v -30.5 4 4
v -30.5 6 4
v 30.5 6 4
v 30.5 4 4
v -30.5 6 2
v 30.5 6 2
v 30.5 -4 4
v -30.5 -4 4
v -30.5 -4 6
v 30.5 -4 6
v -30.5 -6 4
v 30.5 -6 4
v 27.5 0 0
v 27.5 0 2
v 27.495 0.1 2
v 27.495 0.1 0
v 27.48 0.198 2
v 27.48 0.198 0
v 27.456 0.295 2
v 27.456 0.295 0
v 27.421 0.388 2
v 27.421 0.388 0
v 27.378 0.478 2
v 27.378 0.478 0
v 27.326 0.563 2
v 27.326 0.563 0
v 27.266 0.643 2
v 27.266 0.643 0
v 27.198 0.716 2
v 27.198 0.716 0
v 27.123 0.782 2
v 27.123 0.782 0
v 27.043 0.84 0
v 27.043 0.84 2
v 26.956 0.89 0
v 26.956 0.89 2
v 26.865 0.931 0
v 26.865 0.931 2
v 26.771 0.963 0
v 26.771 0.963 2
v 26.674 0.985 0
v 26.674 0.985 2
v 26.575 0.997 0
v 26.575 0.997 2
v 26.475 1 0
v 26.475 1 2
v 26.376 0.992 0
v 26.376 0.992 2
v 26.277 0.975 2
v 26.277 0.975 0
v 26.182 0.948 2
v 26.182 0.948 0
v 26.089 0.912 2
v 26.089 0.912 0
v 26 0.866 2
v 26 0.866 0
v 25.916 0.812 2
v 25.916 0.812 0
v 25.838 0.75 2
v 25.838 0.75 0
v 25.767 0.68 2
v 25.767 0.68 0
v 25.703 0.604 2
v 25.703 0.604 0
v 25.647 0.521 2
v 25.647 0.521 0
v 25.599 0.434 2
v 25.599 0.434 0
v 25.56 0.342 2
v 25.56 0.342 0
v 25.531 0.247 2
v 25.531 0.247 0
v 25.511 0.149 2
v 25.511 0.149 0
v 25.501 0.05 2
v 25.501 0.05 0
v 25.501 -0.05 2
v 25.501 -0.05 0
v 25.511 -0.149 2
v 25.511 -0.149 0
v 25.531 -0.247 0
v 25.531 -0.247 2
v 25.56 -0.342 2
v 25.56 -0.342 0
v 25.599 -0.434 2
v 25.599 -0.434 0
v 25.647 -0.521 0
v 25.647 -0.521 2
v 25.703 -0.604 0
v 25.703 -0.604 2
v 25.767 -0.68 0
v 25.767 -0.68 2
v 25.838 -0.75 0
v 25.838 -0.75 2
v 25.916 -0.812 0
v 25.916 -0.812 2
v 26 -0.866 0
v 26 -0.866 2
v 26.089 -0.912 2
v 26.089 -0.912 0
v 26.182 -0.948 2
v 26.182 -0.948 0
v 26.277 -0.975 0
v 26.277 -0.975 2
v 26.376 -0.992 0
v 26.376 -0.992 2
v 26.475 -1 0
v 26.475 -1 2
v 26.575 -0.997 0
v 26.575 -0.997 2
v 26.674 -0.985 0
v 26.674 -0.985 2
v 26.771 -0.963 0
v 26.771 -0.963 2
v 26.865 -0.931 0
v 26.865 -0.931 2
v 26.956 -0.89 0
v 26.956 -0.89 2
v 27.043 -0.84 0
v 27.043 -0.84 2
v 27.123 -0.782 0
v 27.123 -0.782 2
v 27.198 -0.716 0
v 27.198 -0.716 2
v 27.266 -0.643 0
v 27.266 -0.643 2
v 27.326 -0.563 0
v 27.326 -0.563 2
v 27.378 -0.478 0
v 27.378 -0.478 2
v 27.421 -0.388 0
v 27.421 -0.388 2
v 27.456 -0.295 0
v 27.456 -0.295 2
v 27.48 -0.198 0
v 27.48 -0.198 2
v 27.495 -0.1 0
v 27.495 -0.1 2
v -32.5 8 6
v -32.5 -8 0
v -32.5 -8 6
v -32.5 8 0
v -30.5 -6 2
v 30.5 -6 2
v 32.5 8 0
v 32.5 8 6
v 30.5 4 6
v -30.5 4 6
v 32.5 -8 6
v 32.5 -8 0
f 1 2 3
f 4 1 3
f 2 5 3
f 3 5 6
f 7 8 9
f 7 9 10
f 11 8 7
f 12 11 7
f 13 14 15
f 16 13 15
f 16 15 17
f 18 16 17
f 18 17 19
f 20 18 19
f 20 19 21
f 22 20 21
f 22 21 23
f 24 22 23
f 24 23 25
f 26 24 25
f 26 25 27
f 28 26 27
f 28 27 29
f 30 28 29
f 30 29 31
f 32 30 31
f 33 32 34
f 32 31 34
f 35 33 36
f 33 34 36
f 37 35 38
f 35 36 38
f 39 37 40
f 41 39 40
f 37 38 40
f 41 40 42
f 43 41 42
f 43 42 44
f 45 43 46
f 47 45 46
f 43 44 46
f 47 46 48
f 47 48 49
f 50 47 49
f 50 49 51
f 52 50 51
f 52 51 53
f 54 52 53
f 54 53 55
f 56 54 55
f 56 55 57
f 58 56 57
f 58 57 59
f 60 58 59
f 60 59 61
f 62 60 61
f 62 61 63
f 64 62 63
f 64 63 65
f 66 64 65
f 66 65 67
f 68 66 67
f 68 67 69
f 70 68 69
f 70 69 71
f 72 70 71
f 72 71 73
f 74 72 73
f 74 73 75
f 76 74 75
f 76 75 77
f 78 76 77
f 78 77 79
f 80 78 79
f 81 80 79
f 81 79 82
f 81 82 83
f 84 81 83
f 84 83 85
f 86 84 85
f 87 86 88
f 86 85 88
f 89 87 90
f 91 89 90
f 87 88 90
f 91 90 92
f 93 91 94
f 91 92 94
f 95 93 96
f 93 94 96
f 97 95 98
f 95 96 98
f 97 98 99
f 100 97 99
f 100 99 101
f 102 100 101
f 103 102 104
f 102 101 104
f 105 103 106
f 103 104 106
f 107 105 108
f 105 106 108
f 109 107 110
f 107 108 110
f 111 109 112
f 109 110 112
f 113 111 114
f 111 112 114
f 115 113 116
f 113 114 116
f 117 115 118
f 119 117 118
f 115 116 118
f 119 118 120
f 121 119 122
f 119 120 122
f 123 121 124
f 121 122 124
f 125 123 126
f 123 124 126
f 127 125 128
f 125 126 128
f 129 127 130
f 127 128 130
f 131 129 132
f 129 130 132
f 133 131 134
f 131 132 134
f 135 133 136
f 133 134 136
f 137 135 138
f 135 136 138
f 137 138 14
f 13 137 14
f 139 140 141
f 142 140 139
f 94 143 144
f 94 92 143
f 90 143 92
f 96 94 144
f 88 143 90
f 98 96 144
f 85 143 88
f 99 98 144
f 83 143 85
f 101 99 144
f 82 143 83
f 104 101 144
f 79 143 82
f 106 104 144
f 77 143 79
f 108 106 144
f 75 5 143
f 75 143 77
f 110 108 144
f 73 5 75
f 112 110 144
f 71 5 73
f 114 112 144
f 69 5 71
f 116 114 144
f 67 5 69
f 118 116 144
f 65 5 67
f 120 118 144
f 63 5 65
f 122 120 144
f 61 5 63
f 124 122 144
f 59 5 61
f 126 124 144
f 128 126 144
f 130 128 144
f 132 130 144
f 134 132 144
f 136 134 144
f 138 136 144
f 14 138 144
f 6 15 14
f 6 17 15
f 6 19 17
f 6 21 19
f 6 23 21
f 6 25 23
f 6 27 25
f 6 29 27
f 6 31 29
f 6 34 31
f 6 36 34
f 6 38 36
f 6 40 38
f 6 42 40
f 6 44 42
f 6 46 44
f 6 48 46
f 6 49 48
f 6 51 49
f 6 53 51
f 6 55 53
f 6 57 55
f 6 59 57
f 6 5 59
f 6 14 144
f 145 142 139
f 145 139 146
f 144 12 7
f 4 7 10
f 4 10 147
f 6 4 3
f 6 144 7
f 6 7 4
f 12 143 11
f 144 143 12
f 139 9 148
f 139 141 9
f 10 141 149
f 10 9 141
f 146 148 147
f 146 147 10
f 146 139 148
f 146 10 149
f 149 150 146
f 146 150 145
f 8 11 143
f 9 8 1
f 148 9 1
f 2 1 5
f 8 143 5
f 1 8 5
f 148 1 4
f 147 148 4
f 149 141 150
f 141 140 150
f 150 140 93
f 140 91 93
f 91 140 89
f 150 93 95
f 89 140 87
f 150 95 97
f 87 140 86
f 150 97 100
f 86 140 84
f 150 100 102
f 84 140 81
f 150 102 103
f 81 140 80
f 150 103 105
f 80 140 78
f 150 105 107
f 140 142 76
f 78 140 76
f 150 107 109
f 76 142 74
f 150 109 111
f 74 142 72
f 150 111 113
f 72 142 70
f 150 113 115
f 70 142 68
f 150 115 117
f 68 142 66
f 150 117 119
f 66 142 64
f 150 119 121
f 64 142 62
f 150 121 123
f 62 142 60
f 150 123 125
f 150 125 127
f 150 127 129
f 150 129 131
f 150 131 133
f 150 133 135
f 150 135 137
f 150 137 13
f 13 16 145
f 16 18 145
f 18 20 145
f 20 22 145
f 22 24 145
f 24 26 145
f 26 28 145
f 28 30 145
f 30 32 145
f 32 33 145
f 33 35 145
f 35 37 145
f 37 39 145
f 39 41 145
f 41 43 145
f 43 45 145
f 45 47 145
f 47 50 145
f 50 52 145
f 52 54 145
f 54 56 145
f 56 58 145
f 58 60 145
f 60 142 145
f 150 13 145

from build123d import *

# Parameters (mm, degrees)
SKETCH1_W           = 65
SKETCH1_H           = 16
BOSS_EXTRUDE1_DEPTH = 2
SKETCH2_W           = 65
SKETCH2_H           = 16
SKETCH2_W_2         = 61
SKETCH2_H_2         = 12
BOSS_EXTRUDE2_DEPTH = 2
SKETCH4_W           = 65
SKETCH4_H           = 16
SKETCH4_W_2         = 61
SKETCH4_H_2         = 8
BOSS_EXTRUDE3_DEPTH = 2
SKETCH6_R           = 1
CUT_EXTRUDE2_DEPTH  = 34.708307581


with BuildPart() as part:
    # Sketch1 → Boss-Extrude1 (new body)
    with BuildSketch(Plane.XY):
        Rectangle(SKETCH1_W, SKETCH1_H)
    extrude(amount=BOSS_EXTRUDE1_DEPTH)

    # Sketch2 → Boss-Extrude2 (add)
    with BuildSketch(Plane.XY.offset(2)):
        Rectangle(SKETCH2_W, SKETCH2_H)
        Rectangle(SKETCH2_W_2, SKETCH2_H_2, mode=Mode.SUBTRACT)
    extrude(amount=BOSS_EXTRUDE2_DEPTH)

    # Sketch4 → Boss-Extrude3 (add)
    with BuildSketch(Plane.XY.offset(4)):
        Rectangle(SKETCH4_W, SKETCH4_H)
        Rectangle(SKETCH4_W_2, SKETCH4_H_2, mode=Mode.SUBTRACT)
    extrude(amount=BOSS_EXTRUDE3_DEPTH)

    # Sketch6 → Cut-Extrude2 (cut, through all)
    with BuildSketch(Plane.XY.offset(2)):
        with Locations((26.5, 0)):
            Circle(SKETCH6_R)
    extrude(amount=-CUT_EXTRUDE2_DEPTH, mode=Mode.SUBTRACT)


solid = part.part
